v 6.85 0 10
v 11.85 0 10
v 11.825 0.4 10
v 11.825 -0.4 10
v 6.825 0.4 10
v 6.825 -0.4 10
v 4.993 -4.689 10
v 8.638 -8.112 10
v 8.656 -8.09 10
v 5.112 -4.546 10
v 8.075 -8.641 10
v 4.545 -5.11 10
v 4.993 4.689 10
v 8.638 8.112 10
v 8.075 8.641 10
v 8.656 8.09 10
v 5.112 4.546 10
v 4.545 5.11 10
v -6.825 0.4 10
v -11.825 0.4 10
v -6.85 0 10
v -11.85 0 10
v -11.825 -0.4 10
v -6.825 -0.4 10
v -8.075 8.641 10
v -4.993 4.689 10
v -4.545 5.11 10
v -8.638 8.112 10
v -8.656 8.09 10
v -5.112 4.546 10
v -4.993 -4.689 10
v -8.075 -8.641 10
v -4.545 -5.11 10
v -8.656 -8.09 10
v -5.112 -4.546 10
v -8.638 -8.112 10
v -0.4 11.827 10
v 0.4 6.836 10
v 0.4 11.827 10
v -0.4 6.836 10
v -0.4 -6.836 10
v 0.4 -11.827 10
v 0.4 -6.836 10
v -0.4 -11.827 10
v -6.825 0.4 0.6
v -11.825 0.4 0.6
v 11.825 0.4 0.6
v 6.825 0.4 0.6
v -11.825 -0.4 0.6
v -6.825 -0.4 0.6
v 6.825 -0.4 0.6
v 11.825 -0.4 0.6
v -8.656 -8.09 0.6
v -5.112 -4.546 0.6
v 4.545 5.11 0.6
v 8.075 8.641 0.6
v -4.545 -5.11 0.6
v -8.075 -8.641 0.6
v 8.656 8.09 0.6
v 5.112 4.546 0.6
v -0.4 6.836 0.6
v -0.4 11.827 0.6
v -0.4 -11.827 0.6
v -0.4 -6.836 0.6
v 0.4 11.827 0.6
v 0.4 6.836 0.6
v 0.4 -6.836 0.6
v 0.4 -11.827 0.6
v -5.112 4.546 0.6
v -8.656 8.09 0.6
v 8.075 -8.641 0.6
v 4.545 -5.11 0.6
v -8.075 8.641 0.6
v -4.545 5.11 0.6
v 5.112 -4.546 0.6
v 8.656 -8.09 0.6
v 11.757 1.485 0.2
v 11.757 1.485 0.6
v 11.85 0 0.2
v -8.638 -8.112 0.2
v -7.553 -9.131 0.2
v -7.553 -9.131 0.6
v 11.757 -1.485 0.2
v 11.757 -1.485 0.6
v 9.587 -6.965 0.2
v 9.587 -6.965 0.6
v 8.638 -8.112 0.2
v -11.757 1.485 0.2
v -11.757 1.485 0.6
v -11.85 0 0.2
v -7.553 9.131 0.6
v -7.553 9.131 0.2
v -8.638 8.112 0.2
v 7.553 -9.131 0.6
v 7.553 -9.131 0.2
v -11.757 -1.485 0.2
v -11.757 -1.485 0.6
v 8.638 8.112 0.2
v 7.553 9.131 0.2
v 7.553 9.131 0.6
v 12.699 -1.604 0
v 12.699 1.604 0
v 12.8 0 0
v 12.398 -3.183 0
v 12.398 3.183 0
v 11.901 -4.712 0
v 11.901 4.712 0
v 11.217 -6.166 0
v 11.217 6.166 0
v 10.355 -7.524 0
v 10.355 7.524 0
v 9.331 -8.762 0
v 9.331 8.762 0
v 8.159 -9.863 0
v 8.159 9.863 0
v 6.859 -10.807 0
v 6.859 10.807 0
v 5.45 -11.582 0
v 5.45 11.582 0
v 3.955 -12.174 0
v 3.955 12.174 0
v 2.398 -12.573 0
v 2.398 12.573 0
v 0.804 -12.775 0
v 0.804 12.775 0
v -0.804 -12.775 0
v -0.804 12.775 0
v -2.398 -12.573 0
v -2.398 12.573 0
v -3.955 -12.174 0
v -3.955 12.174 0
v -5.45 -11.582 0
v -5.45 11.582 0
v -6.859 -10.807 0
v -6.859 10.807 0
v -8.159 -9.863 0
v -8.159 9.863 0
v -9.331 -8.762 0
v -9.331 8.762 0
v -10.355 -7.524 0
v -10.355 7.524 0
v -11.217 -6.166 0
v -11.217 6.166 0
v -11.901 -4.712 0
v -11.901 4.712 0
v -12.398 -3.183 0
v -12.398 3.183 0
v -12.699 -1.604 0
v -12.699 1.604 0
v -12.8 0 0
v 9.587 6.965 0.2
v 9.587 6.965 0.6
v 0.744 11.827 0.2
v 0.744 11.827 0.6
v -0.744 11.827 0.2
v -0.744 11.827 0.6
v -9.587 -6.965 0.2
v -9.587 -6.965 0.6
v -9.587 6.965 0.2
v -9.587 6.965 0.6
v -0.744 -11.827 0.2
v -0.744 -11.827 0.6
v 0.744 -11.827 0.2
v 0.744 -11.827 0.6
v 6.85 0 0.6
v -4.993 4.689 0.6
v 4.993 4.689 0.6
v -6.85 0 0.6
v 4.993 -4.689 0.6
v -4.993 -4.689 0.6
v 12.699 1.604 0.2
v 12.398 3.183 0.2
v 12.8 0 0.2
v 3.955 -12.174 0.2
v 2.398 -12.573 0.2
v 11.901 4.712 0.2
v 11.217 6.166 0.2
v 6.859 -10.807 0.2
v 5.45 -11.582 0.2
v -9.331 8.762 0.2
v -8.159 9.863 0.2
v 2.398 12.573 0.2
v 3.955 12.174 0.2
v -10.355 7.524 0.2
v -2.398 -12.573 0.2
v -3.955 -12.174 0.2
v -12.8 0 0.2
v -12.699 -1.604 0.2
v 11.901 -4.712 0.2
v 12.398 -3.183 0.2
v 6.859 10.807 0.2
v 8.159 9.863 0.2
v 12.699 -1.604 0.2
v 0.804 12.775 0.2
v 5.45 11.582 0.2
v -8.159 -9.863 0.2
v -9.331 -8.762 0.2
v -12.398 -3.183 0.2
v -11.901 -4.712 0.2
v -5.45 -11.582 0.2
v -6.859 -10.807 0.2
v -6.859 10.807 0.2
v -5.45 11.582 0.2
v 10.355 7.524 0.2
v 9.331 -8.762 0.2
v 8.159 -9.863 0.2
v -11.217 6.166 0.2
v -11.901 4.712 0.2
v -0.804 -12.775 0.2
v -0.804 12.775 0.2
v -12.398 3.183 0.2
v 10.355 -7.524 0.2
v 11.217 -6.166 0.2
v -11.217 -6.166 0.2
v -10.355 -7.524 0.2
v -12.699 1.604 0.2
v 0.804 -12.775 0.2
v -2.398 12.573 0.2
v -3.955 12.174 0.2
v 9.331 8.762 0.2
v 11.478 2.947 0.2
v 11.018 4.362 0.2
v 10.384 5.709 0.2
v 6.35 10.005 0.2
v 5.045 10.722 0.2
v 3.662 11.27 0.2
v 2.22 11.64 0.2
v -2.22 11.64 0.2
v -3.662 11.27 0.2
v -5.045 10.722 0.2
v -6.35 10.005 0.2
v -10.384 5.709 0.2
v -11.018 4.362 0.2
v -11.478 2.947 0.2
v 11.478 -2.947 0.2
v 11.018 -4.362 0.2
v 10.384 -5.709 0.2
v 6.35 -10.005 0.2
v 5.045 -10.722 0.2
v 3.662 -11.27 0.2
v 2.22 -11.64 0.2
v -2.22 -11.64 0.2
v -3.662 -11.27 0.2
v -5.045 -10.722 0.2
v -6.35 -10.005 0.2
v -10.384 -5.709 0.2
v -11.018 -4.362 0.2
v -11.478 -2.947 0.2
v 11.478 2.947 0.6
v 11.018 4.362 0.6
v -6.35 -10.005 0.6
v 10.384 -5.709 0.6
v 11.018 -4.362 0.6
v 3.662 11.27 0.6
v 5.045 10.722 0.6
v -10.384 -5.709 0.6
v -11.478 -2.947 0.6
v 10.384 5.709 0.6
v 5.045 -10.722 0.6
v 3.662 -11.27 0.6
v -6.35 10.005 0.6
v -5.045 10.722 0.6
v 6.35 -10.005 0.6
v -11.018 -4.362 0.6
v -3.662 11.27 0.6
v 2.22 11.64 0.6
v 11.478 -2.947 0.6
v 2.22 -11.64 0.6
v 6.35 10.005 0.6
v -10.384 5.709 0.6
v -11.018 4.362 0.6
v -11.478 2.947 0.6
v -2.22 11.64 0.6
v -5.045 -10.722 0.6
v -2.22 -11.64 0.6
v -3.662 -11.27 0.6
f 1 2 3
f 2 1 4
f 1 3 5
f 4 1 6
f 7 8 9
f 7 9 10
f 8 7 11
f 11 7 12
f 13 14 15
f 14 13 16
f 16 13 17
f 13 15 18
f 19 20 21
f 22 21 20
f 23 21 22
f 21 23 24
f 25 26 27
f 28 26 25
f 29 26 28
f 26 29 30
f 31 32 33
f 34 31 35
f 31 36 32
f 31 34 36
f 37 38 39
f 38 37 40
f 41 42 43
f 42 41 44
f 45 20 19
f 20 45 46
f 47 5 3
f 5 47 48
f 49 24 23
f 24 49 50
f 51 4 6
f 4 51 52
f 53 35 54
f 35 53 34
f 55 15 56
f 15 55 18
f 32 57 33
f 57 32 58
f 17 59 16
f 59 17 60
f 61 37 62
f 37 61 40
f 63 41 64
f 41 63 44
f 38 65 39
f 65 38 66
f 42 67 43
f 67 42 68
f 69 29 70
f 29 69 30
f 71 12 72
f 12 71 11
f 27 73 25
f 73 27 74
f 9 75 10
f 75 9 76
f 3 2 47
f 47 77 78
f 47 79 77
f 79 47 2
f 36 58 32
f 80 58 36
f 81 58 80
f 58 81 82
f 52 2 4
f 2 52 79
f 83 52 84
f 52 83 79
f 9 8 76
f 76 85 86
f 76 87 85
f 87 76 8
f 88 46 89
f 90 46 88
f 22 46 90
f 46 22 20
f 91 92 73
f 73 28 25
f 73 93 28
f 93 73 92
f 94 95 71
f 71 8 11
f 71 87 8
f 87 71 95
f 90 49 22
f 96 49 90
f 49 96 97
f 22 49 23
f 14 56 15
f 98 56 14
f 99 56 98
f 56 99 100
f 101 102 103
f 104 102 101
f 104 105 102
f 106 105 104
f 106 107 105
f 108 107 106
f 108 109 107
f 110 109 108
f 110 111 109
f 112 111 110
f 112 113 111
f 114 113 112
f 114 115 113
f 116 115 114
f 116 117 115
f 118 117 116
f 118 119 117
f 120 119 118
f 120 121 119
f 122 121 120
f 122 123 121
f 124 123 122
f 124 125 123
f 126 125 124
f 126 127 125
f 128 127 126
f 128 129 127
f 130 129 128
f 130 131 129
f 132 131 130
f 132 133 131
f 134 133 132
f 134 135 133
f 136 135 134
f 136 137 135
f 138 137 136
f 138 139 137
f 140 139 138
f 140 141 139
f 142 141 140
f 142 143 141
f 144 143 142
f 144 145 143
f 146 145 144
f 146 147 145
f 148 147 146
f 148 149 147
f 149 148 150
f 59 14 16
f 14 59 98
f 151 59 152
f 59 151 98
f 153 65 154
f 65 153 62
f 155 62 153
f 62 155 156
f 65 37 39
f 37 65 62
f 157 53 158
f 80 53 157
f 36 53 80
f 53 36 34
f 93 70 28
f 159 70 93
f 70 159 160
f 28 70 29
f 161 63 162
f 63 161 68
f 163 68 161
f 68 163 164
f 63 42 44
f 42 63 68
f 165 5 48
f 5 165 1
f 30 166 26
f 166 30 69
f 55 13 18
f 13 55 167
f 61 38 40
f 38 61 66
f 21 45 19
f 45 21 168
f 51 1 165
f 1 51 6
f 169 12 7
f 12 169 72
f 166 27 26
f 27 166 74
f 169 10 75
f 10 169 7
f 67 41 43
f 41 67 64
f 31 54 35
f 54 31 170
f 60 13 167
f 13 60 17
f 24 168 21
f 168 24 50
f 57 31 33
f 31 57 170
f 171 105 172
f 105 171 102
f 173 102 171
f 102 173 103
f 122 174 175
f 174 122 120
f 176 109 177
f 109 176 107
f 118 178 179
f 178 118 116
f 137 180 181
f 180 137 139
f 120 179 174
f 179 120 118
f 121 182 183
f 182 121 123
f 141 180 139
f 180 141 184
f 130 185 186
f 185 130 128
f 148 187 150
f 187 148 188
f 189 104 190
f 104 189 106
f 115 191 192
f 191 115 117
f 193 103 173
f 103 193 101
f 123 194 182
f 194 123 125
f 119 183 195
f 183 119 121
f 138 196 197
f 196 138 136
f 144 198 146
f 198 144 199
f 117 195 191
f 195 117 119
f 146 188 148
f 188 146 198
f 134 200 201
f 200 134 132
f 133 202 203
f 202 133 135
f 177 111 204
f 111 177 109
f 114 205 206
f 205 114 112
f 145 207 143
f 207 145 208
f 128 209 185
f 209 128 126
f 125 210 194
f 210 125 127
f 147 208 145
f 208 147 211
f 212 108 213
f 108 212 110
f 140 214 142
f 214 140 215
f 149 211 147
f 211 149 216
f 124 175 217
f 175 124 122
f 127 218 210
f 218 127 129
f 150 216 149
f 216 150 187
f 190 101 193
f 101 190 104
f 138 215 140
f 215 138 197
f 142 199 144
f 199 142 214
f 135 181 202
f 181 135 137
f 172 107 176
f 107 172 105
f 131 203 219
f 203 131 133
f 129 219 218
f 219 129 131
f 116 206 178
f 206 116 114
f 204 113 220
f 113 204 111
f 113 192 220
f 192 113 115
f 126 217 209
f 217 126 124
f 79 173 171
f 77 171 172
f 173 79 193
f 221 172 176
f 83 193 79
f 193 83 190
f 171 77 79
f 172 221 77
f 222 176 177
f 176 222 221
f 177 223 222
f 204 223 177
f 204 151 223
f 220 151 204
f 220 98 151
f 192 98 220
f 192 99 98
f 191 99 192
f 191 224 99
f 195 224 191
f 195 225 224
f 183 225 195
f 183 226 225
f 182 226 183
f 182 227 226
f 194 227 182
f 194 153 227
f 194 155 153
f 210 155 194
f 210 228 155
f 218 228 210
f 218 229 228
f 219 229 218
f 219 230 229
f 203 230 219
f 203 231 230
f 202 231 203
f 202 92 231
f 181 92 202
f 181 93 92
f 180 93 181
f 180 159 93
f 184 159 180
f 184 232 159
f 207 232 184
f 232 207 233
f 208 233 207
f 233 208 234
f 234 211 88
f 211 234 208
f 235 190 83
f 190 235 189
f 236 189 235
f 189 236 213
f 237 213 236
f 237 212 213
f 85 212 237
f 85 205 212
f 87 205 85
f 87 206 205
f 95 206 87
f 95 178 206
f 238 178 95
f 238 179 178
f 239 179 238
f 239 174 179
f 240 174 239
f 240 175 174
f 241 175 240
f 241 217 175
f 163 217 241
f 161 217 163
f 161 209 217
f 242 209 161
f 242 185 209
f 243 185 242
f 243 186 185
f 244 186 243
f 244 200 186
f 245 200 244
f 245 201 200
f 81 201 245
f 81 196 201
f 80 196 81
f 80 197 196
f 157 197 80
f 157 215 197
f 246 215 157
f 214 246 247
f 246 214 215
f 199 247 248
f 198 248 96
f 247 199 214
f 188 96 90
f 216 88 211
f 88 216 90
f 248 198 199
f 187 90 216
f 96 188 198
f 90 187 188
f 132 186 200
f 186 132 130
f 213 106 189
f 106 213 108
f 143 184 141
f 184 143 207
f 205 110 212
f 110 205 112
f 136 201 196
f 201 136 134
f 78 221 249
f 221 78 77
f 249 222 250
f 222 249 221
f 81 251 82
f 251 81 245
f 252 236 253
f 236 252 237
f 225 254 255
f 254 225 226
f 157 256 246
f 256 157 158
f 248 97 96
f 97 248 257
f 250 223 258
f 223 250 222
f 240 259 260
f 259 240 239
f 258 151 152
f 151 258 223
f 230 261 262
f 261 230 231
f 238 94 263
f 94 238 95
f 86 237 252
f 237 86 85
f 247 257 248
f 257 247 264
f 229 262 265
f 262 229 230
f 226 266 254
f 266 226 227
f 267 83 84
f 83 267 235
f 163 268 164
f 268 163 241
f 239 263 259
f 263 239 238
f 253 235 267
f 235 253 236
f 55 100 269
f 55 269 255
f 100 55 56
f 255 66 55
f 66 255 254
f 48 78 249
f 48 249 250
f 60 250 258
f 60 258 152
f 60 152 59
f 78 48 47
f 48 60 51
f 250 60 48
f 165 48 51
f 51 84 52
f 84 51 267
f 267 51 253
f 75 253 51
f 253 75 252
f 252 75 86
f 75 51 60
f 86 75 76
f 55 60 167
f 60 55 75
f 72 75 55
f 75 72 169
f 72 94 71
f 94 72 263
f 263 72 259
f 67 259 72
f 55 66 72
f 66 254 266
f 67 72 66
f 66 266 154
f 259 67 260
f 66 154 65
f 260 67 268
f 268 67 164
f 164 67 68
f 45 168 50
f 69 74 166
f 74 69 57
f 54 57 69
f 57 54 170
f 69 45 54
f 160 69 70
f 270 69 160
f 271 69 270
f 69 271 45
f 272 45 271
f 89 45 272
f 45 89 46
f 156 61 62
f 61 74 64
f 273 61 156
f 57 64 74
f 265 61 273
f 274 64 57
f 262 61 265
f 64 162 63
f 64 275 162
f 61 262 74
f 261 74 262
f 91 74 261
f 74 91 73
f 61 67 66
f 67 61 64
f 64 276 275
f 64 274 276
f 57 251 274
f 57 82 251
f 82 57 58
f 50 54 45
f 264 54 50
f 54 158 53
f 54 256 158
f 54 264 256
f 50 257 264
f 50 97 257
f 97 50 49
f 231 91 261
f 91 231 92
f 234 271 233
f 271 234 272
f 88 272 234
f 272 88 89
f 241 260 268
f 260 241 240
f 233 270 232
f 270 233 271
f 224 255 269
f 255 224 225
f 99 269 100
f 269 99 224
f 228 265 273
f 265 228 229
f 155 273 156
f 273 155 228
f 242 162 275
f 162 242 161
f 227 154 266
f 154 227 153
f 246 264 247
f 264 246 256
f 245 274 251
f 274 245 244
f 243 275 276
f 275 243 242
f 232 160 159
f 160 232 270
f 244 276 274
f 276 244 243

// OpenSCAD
$fn=50;

cylinder(d=25.6, h=0.2);
cylinder(d=23.7, h=0.6);
difference()
{
	intersection()
	{
		union()
		{
			for(i = [0 : 45 : 180])
				rotate([0,0,i]) cube([30,0.8,20], center=true);
		}
		cylinder(d=23.7, h=10);
	}
	cylinder(d=13.7, h=11);
}
